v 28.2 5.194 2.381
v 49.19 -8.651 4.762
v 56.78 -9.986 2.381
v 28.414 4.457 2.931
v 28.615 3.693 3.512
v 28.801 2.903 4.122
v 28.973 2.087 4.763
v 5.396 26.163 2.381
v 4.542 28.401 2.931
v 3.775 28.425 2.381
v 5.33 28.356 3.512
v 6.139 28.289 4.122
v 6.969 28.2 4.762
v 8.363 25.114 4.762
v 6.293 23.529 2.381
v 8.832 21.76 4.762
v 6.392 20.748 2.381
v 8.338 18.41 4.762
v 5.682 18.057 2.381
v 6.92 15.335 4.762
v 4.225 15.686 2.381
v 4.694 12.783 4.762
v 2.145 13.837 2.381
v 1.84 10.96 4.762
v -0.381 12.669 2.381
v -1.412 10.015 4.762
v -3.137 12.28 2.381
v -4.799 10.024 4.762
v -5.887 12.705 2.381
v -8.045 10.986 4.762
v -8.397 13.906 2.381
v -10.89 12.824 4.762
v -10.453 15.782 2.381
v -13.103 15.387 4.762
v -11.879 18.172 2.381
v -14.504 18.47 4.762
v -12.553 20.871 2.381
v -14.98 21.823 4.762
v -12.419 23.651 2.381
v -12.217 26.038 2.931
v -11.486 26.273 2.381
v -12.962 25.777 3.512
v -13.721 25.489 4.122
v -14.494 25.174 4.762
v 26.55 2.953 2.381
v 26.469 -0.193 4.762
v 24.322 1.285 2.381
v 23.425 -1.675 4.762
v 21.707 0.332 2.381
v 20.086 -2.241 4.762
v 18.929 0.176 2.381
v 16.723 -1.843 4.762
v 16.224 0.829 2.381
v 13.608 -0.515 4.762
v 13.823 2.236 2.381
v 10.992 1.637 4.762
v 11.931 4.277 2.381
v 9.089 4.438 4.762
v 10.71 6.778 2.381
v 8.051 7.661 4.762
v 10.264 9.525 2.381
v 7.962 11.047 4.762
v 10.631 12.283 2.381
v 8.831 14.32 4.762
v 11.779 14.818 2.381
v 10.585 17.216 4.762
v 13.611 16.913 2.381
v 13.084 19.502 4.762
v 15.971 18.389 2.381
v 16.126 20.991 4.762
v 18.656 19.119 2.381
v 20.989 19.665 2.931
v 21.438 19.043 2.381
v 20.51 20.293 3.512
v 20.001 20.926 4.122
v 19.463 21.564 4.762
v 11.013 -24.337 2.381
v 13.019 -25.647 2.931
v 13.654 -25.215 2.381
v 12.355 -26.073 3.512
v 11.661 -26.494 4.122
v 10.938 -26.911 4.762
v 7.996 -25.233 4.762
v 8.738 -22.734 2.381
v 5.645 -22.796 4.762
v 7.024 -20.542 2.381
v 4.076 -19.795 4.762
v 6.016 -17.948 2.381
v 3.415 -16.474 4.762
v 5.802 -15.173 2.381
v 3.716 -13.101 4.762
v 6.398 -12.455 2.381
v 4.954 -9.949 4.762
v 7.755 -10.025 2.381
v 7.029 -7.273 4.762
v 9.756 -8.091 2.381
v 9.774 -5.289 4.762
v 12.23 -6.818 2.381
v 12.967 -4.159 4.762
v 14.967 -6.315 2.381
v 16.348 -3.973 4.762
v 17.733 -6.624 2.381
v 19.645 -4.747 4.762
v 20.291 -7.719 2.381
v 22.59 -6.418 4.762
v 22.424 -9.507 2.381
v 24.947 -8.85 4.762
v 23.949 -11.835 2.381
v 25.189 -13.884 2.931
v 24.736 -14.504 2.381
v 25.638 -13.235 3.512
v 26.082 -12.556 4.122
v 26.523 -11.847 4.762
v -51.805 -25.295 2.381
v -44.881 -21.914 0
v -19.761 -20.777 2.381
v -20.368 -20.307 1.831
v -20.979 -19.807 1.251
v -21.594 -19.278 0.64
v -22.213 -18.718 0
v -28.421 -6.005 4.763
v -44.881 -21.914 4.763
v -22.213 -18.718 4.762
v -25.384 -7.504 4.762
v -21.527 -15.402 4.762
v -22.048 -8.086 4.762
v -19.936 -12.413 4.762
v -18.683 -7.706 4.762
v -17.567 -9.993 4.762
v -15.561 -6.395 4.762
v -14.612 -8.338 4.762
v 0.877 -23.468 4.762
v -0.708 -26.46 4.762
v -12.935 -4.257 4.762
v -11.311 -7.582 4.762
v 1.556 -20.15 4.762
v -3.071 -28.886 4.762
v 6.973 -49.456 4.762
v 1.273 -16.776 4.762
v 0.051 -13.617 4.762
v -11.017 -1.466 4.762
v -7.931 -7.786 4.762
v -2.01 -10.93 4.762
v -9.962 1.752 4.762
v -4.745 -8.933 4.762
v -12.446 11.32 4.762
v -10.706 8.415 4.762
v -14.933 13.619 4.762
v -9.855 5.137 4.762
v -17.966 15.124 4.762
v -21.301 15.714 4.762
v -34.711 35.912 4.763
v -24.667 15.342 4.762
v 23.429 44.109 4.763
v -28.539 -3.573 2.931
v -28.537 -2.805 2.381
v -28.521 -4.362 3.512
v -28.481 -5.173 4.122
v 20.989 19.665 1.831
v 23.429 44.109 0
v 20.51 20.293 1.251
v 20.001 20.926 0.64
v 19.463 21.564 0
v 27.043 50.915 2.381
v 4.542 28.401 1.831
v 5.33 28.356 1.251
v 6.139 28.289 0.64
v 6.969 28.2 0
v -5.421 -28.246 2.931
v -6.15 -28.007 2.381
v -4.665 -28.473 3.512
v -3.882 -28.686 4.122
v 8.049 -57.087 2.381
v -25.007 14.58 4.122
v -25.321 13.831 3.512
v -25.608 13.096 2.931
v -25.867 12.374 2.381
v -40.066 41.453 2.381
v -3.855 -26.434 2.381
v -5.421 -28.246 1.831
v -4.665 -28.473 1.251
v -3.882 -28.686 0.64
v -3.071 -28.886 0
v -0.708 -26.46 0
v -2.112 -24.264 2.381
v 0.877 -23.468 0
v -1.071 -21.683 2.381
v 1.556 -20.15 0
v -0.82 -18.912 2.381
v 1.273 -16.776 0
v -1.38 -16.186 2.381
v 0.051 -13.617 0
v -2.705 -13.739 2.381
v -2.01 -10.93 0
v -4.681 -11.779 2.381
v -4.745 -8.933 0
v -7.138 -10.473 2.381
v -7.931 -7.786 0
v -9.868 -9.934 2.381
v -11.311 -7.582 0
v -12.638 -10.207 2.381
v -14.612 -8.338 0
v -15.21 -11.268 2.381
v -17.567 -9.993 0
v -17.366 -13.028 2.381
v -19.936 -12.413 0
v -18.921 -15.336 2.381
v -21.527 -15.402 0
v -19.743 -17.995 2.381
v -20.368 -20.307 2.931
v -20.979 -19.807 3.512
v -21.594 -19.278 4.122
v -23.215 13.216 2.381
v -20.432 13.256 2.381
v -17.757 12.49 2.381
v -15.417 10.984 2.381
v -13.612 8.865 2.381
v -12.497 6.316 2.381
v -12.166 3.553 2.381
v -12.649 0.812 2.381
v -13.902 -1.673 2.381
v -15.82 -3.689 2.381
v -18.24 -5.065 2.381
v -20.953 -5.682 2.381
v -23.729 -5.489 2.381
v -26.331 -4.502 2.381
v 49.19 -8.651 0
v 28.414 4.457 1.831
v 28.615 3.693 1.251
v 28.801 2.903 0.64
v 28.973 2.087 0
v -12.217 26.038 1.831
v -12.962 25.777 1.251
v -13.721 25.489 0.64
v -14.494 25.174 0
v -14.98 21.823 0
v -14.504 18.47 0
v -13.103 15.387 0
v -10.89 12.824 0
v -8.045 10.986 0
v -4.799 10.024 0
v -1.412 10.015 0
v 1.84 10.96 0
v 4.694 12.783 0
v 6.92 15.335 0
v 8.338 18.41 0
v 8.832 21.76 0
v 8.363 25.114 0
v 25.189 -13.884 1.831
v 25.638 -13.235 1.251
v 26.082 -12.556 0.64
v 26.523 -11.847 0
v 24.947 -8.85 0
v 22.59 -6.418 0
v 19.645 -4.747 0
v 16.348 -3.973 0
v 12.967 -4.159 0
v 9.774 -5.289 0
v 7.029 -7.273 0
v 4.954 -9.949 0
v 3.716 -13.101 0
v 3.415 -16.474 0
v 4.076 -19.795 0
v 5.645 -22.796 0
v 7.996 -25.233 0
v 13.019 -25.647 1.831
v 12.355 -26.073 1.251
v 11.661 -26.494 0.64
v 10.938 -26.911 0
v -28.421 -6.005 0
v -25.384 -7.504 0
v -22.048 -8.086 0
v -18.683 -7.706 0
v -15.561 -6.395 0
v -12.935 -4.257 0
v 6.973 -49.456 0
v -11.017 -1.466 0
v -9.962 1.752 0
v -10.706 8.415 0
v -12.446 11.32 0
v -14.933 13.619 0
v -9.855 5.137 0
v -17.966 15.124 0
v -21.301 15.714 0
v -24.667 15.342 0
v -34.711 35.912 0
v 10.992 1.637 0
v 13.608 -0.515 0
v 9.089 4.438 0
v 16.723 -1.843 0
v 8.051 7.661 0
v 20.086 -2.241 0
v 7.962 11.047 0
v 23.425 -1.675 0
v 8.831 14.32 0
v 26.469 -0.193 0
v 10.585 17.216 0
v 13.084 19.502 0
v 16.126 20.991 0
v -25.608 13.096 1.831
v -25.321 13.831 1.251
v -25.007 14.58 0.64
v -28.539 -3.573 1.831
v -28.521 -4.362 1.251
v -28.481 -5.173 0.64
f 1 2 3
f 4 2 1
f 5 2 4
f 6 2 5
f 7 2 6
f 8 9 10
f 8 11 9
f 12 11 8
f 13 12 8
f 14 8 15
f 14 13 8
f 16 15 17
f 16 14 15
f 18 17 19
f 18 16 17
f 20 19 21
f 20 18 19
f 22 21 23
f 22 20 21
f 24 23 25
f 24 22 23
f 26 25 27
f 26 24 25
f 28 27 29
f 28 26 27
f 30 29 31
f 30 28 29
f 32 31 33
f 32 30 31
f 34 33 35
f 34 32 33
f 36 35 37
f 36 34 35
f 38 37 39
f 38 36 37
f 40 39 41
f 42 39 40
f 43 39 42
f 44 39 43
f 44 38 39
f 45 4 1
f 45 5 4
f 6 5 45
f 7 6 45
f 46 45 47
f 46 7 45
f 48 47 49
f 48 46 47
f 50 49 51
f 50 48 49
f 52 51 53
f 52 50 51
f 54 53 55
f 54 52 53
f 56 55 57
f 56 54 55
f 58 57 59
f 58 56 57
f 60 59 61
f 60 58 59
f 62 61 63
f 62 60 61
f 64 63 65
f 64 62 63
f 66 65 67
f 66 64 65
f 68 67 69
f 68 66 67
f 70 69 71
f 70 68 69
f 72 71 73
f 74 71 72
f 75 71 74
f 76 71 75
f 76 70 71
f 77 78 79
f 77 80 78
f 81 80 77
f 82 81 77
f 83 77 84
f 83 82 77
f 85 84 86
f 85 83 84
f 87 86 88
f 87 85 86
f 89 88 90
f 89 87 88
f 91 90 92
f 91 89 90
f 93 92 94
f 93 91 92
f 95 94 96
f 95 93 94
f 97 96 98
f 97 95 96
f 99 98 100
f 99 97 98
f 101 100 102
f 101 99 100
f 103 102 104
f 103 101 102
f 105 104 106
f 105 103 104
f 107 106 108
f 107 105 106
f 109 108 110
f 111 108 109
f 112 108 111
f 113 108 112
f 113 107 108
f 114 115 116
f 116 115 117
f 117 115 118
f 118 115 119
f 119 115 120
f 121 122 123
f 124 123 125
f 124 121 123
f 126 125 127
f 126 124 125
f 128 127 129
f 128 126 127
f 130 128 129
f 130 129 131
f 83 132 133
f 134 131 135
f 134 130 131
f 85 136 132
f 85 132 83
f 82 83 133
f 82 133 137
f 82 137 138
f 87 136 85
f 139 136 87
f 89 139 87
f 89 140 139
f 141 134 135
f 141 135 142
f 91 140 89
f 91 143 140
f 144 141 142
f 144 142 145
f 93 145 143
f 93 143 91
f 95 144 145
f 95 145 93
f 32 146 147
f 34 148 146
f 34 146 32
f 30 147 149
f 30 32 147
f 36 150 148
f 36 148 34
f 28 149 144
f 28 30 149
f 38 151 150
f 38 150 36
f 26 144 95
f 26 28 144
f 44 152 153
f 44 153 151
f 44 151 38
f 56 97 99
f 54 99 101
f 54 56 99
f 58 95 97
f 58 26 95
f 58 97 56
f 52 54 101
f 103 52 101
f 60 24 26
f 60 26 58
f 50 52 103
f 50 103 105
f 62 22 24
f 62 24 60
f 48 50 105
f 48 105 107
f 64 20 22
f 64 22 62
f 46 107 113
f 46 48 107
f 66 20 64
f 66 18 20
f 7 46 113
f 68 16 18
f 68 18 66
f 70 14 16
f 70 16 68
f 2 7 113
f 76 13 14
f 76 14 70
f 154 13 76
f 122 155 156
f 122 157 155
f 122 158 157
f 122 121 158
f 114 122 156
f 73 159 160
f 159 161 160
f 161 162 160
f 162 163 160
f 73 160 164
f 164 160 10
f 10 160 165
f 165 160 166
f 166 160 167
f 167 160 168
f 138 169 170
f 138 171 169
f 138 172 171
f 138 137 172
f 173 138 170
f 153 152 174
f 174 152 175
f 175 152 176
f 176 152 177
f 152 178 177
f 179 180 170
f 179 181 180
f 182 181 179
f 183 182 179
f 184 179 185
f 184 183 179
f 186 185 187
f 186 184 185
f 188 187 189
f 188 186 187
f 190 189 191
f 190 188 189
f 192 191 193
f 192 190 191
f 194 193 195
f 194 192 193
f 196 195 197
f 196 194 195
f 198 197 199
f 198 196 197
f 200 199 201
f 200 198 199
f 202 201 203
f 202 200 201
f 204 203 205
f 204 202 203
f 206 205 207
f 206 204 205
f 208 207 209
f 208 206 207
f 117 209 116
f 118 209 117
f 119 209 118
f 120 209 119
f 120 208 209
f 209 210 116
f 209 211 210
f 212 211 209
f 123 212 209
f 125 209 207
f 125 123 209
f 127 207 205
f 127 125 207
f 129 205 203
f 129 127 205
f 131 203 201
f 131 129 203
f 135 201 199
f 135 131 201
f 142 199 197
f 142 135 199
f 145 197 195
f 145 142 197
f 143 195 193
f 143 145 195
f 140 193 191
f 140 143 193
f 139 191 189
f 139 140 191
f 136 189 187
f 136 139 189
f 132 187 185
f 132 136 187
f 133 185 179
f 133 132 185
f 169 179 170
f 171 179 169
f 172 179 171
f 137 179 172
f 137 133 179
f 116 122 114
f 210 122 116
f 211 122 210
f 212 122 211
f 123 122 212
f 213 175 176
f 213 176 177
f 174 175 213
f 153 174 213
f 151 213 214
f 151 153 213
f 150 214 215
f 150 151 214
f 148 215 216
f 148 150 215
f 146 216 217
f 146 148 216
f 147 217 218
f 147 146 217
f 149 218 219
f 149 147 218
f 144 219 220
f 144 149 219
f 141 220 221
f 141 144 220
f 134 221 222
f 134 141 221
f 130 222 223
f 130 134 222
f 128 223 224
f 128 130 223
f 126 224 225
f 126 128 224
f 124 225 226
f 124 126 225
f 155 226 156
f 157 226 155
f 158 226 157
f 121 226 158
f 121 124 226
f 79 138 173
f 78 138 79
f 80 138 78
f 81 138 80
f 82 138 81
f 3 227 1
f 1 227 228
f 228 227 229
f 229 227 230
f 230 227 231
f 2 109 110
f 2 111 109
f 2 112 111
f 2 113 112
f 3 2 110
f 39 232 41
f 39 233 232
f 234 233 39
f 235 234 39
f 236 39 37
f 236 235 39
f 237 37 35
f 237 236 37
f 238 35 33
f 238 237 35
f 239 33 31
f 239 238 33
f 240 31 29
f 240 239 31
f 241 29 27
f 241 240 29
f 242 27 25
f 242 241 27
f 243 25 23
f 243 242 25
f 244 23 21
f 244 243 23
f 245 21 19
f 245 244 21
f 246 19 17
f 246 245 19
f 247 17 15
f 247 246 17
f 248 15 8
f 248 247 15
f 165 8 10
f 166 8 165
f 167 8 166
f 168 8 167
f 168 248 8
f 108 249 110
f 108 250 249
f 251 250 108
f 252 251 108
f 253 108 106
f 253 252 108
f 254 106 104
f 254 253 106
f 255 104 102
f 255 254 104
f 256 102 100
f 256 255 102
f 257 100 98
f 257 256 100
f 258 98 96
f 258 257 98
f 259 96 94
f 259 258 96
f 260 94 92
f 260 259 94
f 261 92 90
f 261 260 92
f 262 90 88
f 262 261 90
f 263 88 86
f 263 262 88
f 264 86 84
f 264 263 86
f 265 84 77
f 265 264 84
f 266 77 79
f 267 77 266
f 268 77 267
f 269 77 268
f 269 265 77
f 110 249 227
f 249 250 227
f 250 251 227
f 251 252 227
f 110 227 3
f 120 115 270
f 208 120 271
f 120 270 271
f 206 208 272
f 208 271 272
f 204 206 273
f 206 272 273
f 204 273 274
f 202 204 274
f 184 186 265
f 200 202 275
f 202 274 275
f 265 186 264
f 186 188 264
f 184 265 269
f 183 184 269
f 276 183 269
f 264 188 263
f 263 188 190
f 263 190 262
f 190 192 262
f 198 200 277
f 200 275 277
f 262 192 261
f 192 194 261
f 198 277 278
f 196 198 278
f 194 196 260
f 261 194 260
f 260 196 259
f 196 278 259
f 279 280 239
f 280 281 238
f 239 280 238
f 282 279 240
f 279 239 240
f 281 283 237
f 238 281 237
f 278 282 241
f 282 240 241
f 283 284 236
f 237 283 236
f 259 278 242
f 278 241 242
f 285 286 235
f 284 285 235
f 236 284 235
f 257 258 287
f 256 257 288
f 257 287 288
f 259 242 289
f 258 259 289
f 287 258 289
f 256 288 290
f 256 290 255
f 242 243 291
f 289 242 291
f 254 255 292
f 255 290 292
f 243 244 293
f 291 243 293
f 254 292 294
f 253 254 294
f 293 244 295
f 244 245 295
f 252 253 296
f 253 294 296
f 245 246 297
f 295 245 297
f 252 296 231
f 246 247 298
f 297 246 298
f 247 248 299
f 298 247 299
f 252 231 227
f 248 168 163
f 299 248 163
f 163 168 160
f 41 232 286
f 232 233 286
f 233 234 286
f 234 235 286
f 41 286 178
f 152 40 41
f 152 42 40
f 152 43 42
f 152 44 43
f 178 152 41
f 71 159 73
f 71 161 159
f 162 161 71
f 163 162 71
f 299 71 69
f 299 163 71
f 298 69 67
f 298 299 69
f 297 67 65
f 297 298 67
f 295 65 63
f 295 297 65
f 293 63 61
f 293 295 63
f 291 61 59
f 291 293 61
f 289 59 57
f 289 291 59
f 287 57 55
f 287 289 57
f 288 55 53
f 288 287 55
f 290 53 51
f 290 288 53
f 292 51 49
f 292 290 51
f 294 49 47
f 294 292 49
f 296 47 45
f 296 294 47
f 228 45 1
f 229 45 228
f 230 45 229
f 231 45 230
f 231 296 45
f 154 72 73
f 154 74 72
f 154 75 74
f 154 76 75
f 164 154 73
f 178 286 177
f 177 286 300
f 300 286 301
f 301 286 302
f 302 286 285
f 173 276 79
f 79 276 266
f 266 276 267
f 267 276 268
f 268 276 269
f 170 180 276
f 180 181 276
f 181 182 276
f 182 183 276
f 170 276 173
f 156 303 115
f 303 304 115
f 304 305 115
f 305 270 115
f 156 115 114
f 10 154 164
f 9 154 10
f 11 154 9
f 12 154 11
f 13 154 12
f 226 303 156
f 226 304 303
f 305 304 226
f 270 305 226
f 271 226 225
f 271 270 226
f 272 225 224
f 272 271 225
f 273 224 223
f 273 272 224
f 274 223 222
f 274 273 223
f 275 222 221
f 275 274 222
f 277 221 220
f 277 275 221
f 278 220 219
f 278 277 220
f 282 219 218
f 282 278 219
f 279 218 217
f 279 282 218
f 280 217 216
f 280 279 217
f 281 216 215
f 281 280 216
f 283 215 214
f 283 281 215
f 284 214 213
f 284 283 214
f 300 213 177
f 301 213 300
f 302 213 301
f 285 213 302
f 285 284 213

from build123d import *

# Parameters (mm, degrees)
F1_DEPTH = 4.7625
F2_R     = 9.525
F3_DEPTH = 4.7635
F4_SIZE  = 2.38124


# Not quite as in the source:
# - a fillet or chamfer is up to 0.001 mm smaller than in the source, because OpenCascade refuses the exact size
# - a feature of the source that left no trace in its solid (it failed there, or was rolled back) is left out


with BuildPart() as f1:
    # F0 (on Top) → F1 (new body)
    with BuildSketch(Plane.XY):
        Polygon((-3.074264621, 21.805118867), (-40.0660246394, 41.4531760826), (-21.6879004002, 3.8143528936), (-51.8053957451, -25.295317935), (-10.3295949709, -19.4477191337), (8.0485292683, -57.0865423226), (15.3038596181, -15.8337043219), (56.7796603923, -9.9861055206), (19.787900374, 9.6619516949), (27.0432307238, 50.9147896956), align=None)
    extrude(amount=F1_DEPTH)

    # F2 (on Top) → F3 (cut, through all)
    with BuildSketch(Plane.XY):
        with Locations((15.3038596181, -15.8337043219)):
            Circle(F2_R)
        with Locations((-10.3295949709, -19.4477191337)):
            Circle(F2_R)
        with Locations((-21.6879004002, 3.8143528936)):
            Circle(F2_R)
        with Locations((-3.074264621, 21.805118867)):
            Circle(F2_R)
        with Locations((19.787900374, 9.6619516949)):
            Circle(F2_R)
    extrude(amount=F3_DEPTH, mode=Mode.SUBTRACT)

    # F4 (size 2.38125 in the source; OpenCascade refuses exactly that, so slightly less here)
    f4_edges = [f1.edges().sort_by_distance(p)[0] for p in [
        (24.240507, 34.97888, 4.7625),
        (15.408887, 39.669767, 4.7625),
        (-1.744503, 12.373398, 4.7625),
        (-25.776163, 33.863161, 4.7625),
        (-32.966583, 26.913355, 4.7625),
        (-12.306882, 2.164469, 4.7625),
        (-40.171052, -14.050296, 4.7625),
        (-35.783356, -23.036399, 4.7625),
        (-5.861568, -11.035682, 4.7625),
        (0.949087, -42.546721, 4.7625),
        (10.851253, -41.150633, 4.7625),
        (8.684234, -8.984896, 4.7625),
        (40.75762, -12.245024, 4.7625),
        (42.489799, -2.39609, 4.7625),
        (11.22872, 5.482711, 4.7625),
        (24.240507, 34.97888, 0),
        (15.408887, 39.669767, 0),
        (-1.744503, 12.373398, 0),
        (-25.776163, 33.863161, 0),
        (-32.966583, 26.913355, 0),
        (-12.306882, 2.164469, 0),
        (-40.171052, -14.050296, 0),
        (-35.783356, -23.036399, 0),
        (-5.861568, -11.035682, 0),
        (0.949087, -42.546721, 0),
        (10.851253, -41.150633, 0),
        (8.684234, -8.984896, 0),
        (40.75762, -12.245024, 0),
        (42.489799, -2.39609, 0),
        (11.22872, 5.482711, 0),
    ]]
    chamfer(f4_edges, length=F4_SIZE)


solid = f1.part
